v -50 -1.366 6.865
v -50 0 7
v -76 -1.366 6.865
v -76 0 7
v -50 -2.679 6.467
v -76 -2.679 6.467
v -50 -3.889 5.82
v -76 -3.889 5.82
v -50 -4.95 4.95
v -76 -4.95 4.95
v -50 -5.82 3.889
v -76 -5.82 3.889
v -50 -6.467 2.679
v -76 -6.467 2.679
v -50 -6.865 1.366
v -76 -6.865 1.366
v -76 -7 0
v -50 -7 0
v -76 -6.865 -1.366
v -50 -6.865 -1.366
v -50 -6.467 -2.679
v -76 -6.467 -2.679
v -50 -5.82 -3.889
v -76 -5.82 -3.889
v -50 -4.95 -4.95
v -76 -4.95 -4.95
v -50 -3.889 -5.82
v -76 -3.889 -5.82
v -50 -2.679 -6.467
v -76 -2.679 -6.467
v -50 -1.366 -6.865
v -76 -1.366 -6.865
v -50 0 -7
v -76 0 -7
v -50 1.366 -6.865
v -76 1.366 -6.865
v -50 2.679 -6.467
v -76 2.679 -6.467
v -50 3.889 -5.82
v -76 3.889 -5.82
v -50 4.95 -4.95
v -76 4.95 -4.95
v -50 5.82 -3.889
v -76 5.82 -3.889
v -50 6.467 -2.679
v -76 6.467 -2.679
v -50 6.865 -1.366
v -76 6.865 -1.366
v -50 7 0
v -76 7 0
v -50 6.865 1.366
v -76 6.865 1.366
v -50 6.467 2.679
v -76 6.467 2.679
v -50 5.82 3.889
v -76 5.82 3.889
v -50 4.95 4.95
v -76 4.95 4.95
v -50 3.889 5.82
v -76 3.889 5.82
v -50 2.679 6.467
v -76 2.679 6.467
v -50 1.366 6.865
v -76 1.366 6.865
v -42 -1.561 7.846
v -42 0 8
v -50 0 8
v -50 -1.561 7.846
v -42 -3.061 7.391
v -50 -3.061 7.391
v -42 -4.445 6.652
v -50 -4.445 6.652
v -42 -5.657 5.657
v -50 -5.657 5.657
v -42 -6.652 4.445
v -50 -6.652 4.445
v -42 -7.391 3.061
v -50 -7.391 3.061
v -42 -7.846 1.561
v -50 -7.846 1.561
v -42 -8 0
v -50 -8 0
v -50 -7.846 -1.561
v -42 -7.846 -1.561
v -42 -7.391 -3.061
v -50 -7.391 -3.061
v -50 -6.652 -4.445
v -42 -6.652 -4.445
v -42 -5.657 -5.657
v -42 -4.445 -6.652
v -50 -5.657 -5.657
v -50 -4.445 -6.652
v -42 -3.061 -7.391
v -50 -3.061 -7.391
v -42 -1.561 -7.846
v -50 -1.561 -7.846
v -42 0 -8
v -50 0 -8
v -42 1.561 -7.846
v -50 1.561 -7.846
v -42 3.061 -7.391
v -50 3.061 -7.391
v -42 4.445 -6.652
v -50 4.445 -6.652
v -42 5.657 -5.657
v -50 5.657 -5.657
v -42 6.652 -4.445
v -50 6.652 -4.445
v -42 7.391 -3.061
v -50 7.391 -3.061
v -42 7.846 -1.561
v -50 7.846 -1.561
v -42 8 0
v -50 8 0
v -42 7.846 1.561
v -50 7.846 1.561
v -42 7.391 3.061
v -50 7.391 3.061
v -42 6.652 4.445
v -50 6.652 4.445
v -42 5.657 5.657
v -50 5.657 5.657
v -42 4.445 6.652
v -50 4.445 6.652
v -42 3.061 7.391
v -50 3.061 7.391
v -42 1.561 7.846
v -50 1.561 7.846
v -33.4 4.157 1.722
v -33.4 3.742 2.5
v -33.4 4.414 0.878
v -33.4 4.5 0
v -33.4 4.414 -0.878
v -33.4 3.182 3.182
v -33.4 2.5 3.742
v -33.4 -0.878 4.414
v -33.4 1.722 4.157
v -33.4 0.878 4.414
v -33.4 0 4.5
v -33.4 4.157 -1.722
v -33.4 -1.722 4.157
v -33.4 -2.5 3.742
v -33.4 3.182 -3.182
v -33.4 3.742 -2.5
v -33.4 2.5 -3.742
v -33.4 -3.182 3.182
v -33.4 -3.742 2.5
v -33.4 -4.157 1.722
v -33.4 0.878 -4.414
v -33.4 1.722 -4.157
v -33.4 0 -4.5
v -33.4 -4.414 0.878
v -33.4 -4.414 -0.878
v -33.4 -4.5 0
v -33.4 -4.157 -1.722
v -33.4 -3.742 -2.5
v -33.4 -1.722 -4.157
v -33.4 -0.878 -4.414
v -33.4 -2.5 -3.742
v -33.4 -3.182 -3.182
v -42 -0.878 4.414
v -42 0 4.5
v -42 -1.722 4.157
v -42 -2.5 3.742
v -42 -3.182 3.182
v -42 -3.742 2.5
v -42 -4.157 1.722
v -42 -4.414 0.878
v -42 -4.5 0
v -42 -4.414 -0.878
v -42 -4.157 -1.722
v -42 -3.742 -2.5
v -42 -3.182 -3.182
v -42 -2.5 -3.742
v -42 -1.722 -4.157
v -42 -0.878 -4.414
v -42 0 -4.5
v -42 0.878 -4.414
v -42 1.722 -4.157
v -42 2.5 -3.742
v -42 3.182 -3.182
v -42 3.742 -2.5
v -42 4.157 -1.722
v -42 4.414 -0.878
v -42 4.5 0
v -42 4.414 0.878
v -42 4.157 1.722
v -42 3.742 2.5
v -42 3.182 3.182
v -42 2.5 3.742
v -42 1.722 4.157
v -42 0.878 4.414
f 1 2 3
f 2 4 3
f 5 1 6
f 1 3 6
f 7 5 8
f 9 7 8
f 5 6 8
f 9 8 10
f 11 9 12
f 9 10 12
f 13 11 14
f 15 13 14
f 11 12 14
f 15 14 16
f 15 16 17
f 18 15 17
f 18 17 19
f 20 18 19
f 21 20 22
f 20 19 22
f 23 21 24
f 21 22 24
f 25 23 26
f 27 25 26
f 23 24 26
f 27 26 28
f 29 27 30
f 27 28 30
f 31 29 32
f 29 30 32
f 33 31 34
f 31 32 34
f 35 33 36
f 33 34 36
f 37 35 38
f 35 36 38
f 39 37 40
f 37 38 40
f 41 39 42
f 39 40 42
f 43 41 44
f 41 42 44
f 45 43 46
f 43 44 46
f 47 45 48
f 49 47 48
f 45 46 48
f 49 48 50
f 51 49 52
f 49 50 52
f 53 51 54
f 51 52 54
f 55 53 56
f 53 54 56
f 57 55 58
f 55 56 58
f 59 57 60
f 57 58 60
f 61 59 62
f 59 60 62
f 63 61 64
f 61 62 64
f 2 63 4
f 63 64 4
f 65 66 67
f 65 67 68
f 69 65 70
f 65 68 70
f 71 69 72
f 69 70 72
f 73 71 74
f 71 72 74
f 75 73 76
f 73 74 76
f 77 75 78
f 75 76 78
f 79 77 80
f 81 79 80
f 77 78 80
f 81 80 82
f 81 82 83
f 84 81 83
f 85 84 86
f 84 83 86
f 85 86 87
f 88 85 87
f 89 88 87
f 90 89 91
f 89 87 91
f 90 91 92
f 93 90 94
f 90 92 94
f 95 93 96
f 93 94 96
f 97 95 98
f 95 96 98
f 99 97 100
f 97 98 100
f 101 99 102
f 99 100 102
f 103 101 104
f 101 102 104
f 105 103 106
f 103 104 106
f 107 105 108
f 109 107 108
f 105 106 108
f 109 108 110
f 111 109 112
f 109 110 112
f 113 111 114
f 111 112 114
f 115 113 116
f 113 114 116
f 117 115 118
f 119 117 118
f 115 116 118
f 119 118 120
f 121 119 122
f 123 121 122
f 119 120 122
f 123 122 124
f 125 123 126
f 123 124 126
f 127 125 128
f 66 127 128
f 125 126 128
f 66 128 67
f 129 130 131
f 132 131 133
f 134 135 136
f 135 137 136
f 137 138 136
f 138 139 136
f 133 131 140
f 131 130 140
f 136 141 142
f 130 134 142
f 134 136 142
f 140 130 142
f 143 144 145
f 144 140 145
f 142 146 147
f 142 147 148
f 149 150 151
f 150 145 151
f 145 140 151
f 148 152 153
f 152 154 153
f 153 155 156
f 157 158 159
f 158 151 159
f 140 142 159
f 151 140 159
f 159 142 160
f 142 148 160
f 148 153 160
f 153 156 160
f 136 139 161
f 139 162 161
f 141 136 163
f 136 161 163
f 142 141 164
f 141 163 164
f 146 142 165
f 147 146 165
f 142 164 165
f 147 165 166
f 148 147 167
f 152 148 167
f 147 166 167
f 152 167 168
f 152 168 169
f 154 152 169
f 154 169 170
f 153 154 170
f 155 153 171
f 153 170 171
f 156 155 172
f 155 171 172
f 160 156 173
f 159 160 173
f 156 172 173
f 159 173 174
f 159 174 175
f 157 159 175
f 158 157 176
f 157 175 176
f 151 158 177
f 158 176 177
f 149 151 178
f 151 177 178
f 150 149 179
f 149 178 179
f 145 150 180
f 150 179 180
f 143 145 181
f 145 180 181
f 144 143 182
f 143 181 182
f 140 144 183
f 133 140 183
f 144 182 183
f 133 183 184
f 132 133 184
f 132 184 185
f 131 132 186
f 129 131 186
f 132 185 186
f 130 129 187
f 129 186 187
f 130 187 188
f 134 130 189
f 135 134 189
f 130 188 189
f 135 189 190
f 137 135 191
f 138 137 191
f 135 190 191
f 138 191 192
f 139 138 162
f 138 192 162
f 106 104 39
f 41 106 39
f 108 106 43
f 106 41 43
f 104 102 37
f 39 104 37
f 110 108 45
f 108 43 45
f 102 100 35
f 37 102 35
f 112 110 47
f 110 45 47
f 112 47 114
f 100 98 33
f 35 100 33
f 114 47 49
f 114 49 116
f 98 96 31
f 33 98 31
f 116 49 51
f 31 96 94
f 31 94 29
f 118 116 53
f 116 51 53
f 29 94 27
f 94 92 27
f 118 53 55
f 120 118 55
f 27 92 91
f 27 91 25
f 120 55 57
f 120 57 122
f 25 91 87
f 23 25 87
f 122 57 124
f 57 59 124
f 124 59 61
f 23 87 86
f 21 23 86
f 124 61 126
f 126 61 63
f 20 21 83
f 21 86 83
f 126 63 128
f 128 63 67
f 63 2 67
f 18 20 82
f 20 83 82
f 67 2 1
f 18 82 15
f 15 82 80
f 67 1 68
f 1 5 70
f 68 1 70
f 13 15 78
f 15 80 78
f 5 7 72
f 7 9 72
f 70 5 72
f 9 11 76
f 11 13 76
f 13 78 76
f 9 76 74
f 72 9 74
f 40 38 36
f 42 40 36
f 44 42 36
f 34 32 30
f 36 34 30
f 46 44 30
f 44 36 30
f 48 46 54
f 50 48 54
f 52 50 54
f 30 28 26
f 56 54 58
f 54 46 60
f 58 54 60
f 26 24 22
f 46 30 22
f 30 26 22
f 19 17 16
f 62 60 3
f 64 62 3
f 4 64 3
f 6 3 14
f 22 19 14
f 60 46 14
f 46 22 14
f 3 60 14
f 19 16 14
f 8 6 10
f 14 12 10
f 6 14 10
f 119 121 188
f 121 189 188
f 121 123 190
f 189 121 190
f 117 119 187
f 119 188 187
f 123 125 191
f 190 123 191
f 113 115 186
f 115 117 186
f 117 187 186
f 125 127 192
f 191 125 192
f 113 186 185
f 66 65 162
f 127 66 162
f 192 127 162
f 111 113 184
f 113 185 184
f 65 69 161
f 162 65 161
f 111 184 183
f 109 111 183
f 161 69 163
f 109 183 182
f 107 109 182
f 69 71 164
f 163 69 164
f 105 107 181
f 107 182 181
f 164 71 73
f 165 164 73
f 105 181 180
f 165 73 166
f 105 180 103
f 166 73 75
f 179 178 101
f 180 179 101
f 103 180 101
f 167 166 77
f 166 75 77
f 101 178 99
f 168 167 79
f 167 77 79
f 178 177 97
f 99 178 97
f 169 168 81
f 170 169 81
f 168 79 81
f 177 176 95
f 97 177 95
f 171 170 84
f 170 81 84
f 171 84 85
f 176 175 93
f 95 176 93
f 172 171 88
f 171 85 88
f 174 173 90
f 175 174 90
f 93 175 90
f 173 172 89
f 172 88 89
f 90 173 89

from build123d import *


with BuildPart() as part:
    # Torch_Plug Sketch → Torch_Plug (revolve)
    with BuildSketch(Plane.XY):
        Polygon((-33.4, 0), (-33.4, 4.5), (-42, 4.5), (-42, 8), (-50, 8), (-50, 7), (-76, 7), (-76, 0), align=None)
    revolve(axis=Axis((-300, 0, 0), (1, 0, 0)))


solid = part.part
